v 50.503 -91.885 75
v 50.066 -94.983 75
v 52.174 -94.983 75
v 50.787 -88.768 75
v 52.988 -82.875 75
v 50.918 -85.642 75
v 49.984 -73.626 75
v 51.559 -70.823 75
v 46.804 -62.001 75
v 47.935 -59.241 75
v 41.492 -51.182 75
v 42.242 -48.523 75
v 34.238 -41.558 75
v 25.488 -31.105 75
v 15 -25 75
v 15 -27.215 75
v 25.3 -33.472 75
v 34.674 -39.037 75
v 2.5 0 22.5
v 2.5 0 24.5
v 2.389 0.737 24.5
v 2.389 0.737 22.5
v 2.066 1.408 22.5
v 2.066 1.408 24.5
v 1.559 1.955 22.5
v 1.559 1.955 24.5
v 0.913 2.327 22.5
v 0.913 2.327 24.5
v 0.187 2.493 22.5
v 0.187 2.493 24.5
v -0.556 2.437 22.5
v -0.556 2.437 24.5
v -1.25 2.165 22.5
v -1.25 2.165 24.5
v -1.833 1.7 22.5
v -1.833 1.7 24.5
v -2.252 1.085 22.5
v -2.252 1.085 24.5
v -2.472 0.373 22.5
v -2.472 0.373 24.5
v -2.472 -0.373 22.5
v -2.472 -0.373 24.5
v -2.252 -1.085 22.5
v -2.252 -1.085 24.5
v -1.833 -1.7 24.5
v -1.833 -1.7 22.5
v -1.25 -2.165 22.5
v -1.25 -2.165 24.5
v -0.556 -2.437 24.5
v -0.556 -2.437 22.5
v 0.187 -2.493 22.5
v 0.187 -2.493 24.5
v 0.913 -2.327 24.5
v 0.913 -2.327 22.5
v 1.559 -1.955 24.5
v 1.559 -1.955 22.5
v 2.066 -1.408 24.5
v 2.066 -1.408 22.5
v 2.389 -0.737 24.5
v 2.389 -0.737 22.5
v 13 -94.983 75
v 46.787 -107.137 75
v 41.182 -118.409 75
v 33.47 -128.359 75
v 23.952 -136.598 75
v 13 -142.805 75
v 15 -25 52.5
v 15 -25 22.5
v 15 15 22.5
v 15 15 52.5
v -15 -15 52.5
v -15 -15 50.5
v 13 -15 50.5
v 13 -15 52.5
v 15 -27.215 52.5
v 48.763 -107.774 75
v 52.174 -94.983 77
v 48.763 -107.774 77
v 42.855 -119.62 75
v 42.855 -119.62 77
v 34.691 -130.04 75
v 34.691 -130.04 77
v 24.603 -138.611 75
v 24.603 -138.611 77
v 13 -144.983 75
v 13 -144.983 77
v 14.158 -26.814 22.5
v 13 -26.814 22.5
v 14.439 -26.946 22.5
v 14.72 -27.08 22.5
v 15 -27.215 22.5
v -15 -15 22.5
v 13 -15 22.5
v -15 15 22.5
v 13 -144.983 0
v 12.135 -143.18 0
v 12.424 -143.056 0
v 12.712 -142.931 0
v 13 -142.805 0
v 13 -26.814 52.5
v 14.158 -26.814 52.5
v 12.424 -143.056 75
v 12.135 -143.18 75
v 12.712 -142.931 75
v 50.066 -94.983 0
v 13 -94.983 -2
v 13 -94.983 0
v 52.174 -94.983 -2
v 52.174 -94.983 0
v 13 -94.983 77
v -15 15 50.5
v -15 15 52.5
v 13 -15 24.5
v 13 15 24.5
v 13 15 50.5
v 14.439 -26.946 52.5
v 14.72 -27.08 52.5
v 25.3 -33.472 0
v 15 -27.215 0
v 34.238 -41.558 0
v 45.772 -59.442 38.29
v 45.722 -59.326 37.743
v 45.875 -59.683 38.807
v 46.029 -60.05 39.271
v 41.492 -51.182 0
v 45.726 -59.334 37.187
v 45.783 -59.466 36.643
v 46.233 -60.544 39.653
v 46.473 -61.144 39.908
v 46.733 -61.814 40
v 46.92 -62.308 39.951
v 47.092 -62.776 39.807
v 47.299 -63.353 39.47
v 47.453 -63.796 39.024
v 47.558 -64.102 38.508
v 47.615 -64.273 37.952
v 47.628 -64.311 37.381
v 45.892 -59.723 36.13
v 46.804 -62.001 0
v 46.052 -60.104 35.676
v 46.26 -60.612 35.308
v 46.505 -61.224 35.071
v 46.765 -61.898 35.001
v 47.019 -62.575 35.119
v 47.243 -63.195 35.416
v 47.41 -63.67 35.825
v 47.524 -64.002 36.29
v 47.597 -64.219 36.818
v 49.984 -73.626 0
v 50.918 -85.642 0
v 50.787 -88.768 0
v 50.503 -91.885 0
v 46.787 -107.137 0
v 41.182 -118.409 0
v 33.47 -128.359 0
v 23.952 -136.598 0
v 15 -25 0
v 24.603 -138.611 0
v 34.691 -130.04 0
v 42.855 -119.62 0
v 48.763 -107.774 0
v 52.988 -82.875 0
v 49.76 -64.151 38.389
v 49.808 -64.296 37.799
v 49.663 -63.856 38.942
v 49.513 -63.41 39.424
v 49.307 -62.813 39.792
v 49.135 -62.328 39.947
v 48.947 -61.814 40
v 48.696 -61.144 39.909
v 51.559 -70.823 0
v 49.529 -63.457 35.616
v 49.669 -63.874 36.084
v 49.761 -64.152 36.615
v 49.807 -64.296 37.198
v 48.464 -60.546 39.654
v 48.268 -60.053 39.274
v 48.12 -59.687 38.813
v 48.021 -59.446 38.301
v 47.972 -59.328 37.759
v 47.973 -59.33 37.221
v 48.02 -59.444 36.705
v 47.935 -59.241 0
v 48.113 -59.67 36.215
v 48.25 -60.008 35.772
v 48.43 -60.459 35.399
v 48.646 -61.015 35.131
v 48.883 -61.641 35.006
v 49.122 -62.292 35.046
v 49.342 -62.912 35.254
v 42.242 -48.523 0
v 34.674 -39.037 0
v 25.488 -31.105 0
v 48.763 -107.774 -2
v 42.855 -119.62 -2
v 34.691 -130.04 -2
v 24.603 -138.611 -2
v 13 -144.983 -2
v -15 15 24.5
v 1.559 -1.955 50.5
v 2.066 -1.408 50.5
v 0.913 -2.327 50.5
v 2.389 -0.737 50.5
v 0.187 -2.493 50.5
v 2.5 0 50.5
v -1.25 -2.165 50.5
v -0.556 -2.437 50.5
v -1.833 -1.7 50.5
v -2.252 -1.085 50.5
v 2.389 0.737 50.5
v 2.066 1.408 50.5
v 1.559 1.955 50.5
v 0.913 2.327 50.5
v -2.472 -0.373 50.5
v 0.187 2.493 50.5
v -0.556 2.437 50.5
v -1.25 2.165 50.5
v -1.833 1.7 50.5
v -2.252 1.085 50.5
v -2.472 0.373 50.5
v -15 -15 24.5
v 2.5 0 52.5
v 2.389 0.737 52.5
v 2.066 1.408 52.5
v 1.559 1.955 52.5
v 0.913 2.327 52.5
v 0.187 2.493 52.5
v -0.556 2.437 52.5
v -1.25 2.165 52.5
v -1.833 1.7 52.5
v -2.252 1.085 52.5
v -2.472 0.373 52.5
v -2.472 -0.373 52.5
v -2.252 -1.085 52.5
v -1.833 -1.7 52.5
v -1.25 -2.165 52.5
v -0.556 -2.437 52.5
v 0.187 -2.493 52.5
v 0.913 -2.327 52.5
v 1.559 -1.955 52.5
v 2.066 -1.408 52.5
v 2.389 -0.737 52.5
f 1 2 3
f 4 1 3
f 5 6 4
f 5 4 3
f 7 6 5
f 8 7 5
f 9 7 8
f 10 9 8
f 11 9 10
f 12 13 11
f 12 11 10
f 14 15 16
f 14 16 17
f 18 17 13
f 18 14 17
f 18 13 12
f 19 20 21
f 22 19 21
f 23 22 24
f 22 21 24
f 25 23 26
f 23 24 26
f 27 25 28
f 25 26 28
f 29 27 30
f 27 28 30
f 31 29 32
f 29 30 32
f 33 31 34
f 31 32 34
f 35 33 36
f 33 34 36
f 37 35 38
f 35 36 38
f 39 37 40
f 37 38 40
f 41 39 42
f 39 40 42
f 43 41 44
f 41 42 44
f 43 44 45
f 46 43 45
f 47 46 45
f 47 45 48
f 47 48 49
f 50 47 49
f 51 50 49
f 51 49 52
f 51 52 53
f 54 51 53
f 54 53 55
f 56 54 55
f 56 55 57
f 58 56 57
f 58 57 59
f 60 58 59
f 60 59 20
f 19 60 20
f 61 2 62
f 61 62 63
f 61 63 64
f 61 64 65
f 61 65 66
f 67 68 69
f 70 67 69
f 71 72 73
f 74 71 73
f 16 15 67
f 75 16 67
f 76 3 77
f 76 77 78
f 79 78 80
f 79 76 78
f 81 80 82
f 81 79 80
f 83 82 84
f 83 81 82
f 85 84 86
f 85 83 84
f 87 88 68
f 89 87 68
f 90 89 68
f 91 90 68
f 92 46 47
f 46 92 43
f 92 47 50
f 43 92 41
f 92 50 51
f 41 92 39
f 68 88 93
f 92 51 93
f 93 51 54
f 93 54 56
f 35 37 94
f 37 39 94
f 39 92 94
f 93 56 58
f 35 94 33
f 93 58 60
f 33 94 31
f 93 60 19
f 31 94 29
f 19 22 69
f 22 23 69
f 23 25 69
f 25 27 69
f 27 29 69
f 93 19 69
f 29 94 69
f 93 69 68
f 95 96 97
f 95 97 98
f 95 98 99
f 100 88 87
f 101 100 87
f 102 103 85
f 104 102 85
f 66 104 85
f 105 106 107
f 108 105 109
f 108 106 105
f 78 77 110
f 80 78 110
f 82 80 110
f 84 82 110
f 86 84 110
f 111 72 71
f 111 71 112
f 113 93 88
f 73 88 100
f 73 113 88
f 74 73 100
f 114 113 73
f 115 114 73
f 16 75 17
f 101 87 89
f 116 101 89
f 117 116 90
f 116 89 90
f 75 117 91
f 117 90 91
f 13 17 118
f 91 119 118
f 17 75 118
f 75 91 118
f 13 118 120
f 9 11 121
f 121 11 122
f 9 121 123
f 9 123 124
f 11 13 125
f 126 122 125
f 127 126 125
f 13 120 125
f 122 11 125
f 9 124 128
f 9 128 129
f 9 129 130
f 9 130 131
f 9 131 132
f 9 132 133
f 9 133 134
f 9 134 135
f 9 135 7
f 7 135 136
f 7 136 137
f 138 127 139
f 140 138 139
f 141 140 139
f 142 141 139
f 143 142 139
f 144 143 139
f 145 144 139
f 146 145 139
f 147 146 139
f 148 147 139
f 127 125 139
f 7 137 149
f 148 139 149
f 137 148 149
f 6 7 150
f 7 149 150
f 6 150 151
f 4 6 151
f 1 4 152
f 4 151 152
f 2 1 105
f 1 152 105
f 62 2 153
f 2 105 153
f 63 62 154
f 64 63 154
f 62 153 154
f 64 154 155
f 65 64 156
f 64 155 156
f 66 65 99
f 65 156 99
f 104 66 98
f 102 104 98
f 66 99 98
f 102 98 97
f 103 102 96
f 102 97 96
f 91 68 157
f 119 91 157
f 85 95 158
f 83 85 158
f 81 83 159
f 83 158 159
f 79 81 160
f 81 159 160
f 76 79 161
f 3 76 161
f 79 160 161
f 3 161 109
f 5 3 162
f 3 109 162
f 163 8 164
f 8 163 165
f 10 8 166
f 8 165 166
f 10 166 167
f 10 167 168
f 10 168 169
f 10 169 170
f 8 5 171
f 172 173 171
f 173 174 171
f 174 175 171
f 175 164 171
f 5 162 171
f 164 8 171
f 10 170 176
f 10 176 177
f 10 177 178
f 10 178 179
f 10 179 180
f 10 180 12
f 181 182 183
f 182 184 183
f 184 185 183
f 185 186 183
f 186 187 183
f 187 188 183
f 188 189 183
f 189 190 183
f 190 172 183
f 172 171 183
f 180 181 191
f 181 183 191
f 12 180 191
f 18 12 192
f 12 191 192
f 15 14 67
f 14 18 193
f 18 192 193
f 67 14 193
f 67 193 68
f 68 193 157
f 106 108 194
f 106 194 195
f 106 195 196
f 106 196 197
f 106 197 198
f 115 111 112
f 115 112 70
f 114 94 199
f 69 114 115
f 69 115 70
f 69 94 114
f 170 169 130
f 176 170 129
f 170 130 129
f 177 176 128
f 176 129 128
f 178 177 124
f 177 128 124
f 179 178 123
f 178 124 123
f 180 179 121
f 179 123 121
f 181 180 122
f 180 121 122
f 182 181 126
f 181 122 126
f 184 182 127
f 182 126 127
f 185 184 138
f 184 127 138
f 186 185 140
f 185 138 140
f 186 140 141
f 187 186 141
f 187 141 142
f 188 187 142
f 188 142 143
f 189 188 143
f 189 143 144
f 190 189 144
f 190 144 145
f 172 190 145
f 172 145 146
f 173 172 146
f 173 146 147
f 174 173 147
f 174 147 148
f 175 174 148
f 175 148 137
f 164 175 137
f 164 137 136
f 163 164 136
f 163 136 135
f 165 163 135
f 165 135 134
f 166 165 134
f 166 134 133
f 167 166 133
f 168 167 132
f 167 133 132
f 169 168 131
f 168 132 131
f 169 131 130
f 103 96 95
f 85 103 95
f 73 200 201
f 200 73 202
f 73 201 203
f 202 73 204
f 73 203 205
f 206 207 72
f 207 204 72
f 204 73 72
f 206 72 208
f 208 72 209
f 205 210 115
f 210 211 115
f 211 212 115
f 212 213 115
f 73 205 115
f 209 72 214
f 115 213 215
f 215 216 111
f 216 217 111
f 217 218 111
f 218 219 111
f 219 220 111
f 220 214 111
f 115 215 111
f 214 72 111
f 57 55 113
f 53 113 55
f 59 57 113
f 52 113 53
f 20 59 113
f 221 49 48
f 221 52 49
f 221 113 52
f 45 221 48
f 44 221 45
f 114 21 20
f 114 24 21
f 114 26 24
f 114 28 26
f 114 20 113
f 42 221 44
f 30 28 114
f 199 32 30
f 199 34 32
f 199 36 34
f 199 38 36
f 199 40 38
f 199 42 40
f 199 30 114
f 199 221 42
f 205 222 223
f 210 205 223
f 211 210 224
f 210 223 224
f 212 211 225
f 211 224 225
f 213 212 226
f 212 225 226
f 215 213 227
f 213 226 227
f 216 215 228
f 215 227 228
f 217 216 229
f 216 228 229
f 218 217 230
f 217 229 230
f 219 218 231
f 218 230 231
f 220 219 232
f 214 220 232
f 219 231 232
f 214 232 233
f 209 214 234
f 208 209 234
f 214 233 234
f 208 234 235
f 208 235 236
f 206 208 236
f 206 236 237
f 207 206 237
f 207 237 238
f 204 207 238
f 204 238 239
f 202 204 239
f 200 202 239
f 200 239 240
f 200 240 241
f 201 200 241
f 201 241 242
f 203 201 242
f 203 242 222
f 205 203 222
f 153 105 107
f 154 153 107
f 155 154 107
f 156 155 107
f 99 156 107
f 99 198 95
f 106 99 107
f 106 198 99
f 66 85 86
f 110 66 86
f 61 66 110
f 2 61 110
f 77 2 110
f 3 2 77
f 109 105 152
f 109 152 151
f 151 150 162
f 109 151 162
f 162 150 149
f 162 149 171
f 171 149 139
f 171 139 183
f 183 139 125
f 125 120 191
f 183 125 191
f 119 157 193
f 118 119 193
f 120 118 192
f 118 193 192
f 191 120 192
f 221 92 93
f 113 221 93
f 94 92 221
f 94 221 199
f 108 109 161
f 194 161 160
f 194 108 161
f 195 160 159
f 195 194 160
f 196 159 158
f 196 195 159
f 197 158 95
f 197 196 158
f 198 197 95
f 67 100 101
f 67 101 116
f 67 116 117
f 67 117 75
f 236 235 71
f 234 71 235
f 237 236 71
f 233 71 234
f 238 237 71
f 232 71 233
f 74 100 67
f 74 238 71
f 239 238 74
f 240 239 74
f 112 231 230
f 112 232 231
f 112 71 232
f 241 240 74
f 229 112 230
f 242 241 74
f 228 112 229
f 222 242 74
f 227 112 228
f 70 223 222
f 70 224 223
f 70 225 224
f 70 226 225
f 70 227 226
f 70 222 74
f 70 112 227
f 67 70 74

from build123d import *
from build123d.topology import SkipClean

# Parameters (mm, degrees)
SKETCH1_W           = 30
SKETCH1_H           = 30
SKETCH1_W_2         = 2
SKETCH1_H_2         = 10
BOSS_EXTRUDE1_DEPTH = 75
SKETCH2_W           = 30
SKETCH2_H           = 22.5
CUT_EXTRUDE1_DEPTH  = 75
SKETCH3_W           = 26
SKETCH3_H           = 30.082215134
CUT_EXTRUDE2_DEPTH  = 28
SKETCH5_R           = 2.5
CUT_EXTRUDE3_DEPTH  = 38
BOSS_EXTRUDE2_DEPTH = 2
BOSS_EXTRUDE3_START = 2
BOSS_EXTRUDE3_DEPTH = 2
SKETCH9_R           = 2.5
CUT_EXTRUDE4_DEPTH  = 169.967145294


with BuildPart() as part:
    # Sketch1 → Boss-Extrude1 (new body)
    with BuildSketch(Plane.XY):
        Rectangle(SKETCH1_W, SKETCH1_H)
        with BuildLine():
            Line((50.917737084, -85.641756384), (53, -85.641756384))
            ThreePointArc((53, -85.641756384), (42.989370072, -49.687860894), (15, -25))
            Line((15, -25), (14.157929479, -26.814088542))
            ThreePointArc((14.157929479, -26.814088542), (41.246515654, -50.786104008), (50.917737084, -85.641756384))
        make_face()
        with Locations((14, -20)):
            Rectangle(SKETCH1_W_2, SKETCH1_H_2)
        Polygon((14.157929479, -26.814088542), (15, -25), (13, -25), (13, -26.814088542), align=None)
        with BuildLine():
            Line((12.135037198, -143.180046466), (13, -144.983332176))
            ThreePointArc((13, -144.983332176), (41.796634815, -121.242036174), (53, -85.641756384))
            Line((53, -85.641756384), (50.917737084, -85.641756384))
            ThreePointArc((50.917737084, -85.641756384), (40.047121172, -120.154156399), (12.135037198, -143.180046466))
        make_face()
    extrude(amount=BOSS_EXTRUDE1_DEPTH)

    # Sketch2 → Cut-Extrude1 (cut)
    with BuildSketch(Plane(origin=(0, 15, 0), x_dir=(1, 0, 0), z_dir=(0, 1, 0))):
        with Locations((0, -11.25)):
            Rectangle(SKETCH2_W, SKETCH2_H)
        with Locations((0, -63.75)):
            Rectangle(SKETCH2_W, SKETCH2_H)
    extrude(amount=-CUT_EXTRUDE1_DEPTH, mode=Mode.SUBTRACT)

    # Sketch3 → Cut-Extrude2 (cut)
    with BuildSketch(Plane.ZY.offset(15)):
        with Locations((37.5, 0.030332794)):
            Rectangle(SKETCH3_W, SKETCH3_H)
    extrude(amount=-CUT_EXTRUDE2_DEPTH, mode=Mode.SUBTRACT)

    # Sketch5 → Cut-Extrude3 (cut)
    with BuildSketch(Plane.XY.offset(52.5)):
        Circle(SKETCH5_R)
    extrude(amount=-CUT_EXTRUDE3_DEPTH, mode=Mode.SUBTRACT)

    # Sketch6 → Boss-Extrude2 (add)
    with SkipClean():  # the faces are left unmerged after this step: merging them gives an invalid solid
        with BuildSketch(Plane.XY.offset(75)):
            with BuildLine():
                Line((13, -144.983332176), (13, -94.983332176))
                Line((13, -94.983332176), (52.174379027, -94.983332176))
                ThreePointArc((52.174379027, -94.983332176), (39.036739849, -125.036474764), (13, -144.983332176))
            make_face()
        extrude(amount=BOSS_EXTRUDE2_DEPTH)

    # Sketch7 → Boss-Extrude3 (add)
    with SkipClean():  # the faces are left unmerged after this step: merging them gives an invalid solid
        with BuildSketch(Plane(origin=(0, 0, 0), x_dir=(-1, 0, 0), z_dir=(0, 0, -1)).offset(BOSS_EXTRUDE3_START)):
            with BuildLine():
                Line((-13, -144.983332176), (-13, -94.983332176))
                Line((-13, -94.983332176), (-52.174379027, -94.983332176))
                ThreePointArc((-52.174379027, -94.983332176), (-39.036739849, -125.036474764), (-13, -144.983332176))
            make_face()
        extrude(amount=-BOSS_EXTRUDE3_DEPTH)

    # Sketch9 → Cut-Extrude4 (cut, through all)
    with SkipClean():  # the faces are left unmerged after this step: merging them gives an invalid solid
        with BuildSketch(Plane.ZY.offset(-13)):
            with Locations((37.5, -61.814088542)):
                Circle(SKETCH9_R)
        extrude(amount=-CUT_EXTRUDE4_DEPTH, mode=Mode.SUBTRACT)


solid = part.part
